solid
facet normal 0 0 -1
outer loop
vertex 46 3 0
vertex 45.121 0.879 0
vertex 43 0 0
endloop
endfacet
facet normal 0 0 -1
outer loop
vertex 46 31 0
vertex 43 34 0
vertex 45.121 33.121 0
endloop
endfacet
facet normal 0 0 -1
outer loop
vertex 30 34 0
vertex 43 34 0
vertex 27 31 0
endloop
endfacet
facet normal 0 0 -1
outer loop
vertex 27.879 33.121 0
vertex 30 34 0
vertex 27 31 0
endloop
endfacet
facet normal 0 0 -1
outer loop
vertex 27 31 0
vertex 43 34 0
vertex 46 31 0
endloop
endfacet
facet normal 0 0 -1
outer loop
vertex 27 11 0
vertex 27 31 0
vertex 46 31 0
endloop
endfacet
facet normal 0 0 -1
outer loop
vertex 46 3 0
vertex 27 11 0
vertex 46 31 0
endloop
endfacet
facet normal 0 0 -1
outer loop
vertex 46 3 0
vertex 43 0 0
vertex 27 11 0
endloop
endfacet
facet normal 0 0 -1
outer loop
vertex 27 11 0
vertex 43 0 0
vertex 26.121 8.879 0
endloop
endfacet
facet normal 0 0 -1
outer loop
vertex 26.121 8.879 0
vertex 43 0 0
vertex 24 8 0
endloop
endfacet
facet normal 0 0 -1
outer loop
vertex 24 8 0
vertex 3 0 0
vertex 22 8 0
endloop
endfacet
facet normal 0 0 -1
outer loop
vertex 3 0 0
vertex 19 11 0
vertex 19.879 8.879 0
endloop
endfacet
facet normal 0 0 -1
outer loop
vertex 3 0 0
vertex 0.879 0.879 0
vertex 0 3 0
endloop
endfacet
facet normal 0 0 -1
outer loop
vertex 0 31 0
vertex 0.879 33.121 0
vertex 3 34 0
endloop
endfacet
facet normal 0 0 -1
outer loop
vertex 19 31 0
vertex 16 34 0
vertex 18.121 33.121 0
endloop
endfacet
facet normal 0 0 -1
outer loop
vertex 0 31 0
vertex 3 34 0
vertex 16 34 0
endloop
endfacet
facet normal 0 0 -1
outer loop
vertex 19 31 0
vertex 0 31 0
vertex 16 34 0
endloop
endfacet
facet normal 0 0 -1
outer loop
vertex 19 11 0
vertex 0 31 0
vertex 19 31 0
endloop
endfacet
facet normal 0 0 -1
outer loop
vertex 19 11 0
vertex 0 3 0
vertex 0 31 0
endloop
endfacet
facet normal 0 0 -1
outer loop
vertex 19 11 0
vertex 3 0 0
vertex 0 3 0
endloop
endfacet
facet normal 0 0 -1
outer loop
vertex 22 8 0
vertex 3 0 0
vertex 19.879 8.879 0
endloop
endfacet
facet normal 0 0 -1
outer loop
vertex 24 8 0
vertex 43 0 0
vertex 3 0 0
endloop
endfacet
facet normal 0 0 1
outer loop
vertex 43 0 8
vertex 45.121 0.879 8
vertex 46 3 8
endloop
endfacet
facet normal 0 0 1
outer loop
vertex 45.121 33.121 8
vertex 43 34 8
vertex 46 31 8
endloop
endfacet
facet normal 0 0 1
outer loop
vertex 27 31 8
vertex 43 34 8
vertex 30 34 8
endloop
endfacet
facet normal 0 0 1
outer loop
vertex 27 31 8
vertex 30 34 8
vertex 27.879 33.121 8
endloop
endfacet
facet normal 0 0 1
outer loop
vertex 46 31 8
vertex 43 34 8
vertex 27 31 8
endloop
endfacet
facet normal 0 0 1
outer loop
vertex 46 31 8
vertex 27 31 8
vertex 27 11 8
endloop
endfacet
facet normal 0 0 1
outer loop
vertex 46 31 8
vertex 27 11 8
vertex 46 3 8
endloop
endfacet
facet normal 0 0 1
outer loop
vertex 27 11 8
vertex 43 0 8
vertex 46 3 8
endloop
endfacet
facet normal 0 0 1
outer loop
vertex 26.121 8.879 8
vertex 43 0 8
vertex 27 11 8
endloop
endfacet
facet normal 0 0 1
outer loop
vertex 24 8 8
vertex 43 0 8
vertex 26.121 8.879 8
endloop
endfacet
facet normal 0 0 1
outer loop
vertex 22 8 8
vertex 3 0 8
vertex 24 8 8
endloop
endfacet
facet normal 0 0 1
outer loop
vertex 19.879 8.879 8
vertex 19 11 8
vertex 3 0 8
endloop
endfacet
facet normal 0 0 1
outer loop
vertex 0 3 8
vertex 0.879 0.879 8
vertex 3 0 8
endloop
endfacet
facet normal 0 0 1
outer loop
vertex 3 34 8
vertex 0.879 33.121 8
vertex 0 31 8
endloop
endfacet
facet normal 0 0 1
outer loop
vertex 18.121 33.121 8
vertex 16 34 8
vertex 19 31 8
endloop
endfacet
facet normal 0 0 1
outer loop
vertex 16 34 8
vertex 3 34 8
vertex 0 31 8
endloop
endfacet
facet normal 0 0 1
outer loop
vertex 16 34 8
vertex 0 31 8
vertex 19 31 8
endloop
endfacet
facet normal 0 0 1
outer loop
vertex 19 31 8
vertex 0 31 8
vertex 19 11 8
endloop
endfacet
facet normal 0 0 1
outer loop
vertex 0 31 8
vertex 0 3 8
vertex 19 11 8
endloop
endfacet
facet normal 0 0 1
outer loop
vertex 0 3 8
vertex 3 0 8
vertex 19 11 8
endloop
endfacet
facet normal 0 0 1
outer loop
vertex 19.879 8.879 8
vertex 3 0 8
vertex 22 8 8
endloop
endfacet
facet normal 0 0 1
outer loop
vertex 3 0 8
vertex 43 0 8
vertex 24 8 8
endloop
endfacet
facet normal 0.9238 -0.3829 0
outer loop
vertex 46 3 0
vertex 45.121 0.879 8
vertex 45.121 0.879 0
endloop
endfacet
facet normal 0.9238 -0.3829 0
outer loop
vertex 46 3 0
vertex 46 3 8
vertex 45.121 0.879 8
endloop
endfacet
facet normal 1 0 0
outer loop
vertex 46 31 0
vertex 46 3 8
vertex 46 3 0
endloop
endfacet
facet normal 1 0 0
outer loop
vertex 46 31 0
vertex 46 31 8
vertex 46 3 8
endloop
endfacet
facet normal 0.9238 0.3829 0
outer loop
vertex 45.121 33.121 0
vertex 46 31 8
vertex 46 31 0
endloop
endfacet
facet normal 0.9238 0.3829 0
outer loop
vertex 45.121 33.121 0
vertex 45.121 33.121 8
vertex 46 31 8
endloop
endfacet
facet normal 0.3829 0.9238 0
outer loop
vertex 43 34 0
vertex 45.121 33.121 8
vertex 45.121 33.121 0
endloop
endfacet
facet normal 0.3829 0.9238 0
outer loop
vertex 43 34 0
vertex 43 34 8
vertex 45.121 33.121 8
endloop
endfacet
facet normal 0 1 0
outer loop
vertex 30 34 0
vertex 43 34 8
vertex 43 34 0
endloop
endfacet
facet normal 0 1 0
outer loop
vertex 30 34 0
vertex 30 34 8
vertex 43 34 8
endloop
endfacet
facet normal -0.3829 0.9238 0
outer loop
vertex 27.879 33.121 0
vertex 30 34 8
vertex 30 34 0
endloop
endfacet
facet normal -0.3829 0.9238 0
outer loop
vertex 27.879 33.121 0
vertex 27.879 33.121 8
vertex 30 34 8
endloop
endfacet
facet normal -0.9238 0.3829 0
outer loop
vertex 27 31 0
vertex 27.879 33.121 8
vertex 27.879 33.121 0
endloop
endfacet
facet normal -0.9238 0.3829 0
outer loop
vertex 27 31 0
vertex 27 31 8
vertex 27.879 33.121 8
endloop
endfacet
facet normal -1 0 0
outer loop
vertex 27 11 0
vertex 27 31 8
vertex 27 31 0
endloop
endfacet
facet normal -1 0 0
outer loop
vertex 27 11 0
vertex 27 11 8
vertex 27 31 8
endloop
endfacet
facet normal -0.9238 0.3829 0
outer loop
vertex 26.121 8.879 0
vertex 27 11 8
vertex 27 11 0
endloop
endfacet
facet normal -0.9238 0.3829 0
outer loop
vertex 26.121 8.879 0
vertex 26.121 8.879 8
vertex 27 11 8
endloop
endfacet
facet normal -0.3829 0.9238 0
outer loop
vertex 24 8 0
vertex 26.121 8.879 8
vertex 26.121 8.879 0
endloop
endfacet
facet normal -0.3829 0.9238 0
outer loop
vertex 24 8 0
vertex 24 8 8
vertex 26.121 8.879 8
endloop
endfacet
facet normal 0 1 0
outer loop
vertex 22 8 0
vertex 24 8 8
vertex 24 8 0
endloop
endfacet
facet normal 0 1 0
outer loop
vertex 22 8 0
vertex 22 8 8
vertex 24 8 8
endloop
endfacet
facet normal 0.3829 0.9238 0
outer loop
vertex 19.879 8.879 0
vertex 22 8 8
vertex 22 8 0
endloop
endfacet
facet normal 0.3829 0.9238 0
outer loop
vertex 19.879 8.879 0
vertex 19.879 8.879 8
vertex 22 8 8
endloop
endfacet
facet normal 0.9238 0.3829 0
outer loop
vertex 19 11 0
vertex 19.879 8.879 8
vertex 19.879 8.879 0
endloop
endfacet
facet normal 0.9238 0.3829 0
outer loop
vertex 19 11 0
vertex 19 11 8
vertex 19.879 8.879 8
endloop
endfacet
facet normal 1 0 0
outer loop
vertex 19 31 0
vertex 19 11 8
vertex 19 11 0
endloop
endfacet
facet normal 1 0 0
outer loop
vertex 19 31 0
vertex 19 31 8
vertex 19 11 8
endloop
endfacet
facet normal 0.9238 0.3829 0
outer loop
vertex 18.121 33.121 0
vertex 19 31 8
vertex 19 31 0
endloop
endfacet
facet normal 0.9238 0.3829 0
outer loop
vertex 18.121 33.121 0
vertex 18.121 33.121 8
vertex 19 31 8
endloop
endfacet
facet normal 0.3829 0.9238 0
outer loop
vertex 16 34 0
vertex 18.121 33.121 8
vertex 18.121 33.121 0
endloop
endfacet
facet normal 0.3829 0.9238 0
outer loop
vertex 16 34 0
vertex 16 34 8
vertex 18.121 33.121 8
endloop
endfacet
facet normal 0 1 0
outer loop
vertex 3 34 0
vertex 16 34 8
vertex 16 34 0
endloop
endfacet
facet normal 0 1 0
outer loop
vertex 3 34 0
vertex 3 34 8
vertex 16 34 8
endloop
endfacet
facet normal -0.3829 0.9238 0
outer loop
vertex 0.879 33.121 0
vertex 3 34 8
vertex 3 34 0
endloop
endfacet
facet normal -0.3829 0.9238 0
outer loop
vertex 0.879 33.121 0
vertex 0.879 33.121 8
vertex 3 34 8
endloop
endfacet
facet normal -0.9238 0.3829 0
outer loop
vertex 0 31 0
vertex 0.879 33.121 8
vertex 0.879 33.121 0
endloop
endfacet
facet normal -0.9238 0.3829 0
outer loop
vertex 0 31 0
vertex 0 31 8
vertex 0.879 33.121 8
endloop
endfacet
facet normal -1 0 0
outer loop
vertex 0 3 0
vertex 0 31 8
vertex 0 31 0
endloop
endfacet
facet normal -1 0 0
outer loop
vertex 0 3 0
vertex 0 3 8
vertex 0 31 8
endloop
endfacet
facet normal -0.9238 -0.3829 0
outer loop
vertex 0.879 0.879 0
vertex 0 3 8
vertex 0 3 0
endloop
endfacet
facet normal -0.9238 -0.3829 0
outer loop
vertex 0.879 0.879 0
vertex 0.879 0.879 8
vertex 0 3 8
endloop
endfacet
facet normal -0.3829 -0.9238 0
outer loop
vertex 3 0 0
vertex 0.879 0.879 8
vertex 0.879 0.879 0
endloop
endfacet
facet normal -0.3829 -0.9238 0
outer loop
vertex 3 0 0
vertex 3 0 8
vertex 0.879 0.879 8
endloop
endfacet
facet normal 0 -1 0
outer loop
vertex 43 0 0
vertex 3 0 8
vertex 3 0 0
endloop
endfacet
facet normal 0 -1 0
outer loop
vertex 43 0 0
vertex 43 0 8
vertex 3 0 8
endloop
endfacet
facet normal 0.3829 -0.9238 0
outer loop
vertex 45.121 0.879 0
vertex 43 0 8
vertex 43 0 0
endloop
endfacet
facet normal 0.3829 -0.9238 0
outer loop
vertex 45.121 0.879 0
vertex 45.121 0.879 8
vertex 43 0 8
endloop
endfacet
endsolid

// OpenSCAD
$fn = 32;

// ----------------------------------------------------------------------
// Eye lug: clevis, 8 mm thick
// ----------------------------------------------------------------------

// --- parameters (mm) ---
profile_height = 8;       // extrusion height
profile_points = 24;      // points of the closed outline

profile = [[0, 3], [0.879, 0.879], [3, 0], [43, 0], [45.121, 0.879], [46, 3], [46, 31], [45.121, 33.121], [43, 34], [30, 34], [27.879, 33.121], [27, 31], [27, 11], [26.121, 8.879], [24, 8], [22, 8], [19.879, 8.879], [19, 11], [19, 31], [18.121, 33.121], [16, 34], [3, 34], [0.879, 33.121], [0, 31]];  // single closed polygon, 24 points, counter clockwise

// --- the one profile operation ---
linear_extrude(height = profile_height) polygon(points = profile);
